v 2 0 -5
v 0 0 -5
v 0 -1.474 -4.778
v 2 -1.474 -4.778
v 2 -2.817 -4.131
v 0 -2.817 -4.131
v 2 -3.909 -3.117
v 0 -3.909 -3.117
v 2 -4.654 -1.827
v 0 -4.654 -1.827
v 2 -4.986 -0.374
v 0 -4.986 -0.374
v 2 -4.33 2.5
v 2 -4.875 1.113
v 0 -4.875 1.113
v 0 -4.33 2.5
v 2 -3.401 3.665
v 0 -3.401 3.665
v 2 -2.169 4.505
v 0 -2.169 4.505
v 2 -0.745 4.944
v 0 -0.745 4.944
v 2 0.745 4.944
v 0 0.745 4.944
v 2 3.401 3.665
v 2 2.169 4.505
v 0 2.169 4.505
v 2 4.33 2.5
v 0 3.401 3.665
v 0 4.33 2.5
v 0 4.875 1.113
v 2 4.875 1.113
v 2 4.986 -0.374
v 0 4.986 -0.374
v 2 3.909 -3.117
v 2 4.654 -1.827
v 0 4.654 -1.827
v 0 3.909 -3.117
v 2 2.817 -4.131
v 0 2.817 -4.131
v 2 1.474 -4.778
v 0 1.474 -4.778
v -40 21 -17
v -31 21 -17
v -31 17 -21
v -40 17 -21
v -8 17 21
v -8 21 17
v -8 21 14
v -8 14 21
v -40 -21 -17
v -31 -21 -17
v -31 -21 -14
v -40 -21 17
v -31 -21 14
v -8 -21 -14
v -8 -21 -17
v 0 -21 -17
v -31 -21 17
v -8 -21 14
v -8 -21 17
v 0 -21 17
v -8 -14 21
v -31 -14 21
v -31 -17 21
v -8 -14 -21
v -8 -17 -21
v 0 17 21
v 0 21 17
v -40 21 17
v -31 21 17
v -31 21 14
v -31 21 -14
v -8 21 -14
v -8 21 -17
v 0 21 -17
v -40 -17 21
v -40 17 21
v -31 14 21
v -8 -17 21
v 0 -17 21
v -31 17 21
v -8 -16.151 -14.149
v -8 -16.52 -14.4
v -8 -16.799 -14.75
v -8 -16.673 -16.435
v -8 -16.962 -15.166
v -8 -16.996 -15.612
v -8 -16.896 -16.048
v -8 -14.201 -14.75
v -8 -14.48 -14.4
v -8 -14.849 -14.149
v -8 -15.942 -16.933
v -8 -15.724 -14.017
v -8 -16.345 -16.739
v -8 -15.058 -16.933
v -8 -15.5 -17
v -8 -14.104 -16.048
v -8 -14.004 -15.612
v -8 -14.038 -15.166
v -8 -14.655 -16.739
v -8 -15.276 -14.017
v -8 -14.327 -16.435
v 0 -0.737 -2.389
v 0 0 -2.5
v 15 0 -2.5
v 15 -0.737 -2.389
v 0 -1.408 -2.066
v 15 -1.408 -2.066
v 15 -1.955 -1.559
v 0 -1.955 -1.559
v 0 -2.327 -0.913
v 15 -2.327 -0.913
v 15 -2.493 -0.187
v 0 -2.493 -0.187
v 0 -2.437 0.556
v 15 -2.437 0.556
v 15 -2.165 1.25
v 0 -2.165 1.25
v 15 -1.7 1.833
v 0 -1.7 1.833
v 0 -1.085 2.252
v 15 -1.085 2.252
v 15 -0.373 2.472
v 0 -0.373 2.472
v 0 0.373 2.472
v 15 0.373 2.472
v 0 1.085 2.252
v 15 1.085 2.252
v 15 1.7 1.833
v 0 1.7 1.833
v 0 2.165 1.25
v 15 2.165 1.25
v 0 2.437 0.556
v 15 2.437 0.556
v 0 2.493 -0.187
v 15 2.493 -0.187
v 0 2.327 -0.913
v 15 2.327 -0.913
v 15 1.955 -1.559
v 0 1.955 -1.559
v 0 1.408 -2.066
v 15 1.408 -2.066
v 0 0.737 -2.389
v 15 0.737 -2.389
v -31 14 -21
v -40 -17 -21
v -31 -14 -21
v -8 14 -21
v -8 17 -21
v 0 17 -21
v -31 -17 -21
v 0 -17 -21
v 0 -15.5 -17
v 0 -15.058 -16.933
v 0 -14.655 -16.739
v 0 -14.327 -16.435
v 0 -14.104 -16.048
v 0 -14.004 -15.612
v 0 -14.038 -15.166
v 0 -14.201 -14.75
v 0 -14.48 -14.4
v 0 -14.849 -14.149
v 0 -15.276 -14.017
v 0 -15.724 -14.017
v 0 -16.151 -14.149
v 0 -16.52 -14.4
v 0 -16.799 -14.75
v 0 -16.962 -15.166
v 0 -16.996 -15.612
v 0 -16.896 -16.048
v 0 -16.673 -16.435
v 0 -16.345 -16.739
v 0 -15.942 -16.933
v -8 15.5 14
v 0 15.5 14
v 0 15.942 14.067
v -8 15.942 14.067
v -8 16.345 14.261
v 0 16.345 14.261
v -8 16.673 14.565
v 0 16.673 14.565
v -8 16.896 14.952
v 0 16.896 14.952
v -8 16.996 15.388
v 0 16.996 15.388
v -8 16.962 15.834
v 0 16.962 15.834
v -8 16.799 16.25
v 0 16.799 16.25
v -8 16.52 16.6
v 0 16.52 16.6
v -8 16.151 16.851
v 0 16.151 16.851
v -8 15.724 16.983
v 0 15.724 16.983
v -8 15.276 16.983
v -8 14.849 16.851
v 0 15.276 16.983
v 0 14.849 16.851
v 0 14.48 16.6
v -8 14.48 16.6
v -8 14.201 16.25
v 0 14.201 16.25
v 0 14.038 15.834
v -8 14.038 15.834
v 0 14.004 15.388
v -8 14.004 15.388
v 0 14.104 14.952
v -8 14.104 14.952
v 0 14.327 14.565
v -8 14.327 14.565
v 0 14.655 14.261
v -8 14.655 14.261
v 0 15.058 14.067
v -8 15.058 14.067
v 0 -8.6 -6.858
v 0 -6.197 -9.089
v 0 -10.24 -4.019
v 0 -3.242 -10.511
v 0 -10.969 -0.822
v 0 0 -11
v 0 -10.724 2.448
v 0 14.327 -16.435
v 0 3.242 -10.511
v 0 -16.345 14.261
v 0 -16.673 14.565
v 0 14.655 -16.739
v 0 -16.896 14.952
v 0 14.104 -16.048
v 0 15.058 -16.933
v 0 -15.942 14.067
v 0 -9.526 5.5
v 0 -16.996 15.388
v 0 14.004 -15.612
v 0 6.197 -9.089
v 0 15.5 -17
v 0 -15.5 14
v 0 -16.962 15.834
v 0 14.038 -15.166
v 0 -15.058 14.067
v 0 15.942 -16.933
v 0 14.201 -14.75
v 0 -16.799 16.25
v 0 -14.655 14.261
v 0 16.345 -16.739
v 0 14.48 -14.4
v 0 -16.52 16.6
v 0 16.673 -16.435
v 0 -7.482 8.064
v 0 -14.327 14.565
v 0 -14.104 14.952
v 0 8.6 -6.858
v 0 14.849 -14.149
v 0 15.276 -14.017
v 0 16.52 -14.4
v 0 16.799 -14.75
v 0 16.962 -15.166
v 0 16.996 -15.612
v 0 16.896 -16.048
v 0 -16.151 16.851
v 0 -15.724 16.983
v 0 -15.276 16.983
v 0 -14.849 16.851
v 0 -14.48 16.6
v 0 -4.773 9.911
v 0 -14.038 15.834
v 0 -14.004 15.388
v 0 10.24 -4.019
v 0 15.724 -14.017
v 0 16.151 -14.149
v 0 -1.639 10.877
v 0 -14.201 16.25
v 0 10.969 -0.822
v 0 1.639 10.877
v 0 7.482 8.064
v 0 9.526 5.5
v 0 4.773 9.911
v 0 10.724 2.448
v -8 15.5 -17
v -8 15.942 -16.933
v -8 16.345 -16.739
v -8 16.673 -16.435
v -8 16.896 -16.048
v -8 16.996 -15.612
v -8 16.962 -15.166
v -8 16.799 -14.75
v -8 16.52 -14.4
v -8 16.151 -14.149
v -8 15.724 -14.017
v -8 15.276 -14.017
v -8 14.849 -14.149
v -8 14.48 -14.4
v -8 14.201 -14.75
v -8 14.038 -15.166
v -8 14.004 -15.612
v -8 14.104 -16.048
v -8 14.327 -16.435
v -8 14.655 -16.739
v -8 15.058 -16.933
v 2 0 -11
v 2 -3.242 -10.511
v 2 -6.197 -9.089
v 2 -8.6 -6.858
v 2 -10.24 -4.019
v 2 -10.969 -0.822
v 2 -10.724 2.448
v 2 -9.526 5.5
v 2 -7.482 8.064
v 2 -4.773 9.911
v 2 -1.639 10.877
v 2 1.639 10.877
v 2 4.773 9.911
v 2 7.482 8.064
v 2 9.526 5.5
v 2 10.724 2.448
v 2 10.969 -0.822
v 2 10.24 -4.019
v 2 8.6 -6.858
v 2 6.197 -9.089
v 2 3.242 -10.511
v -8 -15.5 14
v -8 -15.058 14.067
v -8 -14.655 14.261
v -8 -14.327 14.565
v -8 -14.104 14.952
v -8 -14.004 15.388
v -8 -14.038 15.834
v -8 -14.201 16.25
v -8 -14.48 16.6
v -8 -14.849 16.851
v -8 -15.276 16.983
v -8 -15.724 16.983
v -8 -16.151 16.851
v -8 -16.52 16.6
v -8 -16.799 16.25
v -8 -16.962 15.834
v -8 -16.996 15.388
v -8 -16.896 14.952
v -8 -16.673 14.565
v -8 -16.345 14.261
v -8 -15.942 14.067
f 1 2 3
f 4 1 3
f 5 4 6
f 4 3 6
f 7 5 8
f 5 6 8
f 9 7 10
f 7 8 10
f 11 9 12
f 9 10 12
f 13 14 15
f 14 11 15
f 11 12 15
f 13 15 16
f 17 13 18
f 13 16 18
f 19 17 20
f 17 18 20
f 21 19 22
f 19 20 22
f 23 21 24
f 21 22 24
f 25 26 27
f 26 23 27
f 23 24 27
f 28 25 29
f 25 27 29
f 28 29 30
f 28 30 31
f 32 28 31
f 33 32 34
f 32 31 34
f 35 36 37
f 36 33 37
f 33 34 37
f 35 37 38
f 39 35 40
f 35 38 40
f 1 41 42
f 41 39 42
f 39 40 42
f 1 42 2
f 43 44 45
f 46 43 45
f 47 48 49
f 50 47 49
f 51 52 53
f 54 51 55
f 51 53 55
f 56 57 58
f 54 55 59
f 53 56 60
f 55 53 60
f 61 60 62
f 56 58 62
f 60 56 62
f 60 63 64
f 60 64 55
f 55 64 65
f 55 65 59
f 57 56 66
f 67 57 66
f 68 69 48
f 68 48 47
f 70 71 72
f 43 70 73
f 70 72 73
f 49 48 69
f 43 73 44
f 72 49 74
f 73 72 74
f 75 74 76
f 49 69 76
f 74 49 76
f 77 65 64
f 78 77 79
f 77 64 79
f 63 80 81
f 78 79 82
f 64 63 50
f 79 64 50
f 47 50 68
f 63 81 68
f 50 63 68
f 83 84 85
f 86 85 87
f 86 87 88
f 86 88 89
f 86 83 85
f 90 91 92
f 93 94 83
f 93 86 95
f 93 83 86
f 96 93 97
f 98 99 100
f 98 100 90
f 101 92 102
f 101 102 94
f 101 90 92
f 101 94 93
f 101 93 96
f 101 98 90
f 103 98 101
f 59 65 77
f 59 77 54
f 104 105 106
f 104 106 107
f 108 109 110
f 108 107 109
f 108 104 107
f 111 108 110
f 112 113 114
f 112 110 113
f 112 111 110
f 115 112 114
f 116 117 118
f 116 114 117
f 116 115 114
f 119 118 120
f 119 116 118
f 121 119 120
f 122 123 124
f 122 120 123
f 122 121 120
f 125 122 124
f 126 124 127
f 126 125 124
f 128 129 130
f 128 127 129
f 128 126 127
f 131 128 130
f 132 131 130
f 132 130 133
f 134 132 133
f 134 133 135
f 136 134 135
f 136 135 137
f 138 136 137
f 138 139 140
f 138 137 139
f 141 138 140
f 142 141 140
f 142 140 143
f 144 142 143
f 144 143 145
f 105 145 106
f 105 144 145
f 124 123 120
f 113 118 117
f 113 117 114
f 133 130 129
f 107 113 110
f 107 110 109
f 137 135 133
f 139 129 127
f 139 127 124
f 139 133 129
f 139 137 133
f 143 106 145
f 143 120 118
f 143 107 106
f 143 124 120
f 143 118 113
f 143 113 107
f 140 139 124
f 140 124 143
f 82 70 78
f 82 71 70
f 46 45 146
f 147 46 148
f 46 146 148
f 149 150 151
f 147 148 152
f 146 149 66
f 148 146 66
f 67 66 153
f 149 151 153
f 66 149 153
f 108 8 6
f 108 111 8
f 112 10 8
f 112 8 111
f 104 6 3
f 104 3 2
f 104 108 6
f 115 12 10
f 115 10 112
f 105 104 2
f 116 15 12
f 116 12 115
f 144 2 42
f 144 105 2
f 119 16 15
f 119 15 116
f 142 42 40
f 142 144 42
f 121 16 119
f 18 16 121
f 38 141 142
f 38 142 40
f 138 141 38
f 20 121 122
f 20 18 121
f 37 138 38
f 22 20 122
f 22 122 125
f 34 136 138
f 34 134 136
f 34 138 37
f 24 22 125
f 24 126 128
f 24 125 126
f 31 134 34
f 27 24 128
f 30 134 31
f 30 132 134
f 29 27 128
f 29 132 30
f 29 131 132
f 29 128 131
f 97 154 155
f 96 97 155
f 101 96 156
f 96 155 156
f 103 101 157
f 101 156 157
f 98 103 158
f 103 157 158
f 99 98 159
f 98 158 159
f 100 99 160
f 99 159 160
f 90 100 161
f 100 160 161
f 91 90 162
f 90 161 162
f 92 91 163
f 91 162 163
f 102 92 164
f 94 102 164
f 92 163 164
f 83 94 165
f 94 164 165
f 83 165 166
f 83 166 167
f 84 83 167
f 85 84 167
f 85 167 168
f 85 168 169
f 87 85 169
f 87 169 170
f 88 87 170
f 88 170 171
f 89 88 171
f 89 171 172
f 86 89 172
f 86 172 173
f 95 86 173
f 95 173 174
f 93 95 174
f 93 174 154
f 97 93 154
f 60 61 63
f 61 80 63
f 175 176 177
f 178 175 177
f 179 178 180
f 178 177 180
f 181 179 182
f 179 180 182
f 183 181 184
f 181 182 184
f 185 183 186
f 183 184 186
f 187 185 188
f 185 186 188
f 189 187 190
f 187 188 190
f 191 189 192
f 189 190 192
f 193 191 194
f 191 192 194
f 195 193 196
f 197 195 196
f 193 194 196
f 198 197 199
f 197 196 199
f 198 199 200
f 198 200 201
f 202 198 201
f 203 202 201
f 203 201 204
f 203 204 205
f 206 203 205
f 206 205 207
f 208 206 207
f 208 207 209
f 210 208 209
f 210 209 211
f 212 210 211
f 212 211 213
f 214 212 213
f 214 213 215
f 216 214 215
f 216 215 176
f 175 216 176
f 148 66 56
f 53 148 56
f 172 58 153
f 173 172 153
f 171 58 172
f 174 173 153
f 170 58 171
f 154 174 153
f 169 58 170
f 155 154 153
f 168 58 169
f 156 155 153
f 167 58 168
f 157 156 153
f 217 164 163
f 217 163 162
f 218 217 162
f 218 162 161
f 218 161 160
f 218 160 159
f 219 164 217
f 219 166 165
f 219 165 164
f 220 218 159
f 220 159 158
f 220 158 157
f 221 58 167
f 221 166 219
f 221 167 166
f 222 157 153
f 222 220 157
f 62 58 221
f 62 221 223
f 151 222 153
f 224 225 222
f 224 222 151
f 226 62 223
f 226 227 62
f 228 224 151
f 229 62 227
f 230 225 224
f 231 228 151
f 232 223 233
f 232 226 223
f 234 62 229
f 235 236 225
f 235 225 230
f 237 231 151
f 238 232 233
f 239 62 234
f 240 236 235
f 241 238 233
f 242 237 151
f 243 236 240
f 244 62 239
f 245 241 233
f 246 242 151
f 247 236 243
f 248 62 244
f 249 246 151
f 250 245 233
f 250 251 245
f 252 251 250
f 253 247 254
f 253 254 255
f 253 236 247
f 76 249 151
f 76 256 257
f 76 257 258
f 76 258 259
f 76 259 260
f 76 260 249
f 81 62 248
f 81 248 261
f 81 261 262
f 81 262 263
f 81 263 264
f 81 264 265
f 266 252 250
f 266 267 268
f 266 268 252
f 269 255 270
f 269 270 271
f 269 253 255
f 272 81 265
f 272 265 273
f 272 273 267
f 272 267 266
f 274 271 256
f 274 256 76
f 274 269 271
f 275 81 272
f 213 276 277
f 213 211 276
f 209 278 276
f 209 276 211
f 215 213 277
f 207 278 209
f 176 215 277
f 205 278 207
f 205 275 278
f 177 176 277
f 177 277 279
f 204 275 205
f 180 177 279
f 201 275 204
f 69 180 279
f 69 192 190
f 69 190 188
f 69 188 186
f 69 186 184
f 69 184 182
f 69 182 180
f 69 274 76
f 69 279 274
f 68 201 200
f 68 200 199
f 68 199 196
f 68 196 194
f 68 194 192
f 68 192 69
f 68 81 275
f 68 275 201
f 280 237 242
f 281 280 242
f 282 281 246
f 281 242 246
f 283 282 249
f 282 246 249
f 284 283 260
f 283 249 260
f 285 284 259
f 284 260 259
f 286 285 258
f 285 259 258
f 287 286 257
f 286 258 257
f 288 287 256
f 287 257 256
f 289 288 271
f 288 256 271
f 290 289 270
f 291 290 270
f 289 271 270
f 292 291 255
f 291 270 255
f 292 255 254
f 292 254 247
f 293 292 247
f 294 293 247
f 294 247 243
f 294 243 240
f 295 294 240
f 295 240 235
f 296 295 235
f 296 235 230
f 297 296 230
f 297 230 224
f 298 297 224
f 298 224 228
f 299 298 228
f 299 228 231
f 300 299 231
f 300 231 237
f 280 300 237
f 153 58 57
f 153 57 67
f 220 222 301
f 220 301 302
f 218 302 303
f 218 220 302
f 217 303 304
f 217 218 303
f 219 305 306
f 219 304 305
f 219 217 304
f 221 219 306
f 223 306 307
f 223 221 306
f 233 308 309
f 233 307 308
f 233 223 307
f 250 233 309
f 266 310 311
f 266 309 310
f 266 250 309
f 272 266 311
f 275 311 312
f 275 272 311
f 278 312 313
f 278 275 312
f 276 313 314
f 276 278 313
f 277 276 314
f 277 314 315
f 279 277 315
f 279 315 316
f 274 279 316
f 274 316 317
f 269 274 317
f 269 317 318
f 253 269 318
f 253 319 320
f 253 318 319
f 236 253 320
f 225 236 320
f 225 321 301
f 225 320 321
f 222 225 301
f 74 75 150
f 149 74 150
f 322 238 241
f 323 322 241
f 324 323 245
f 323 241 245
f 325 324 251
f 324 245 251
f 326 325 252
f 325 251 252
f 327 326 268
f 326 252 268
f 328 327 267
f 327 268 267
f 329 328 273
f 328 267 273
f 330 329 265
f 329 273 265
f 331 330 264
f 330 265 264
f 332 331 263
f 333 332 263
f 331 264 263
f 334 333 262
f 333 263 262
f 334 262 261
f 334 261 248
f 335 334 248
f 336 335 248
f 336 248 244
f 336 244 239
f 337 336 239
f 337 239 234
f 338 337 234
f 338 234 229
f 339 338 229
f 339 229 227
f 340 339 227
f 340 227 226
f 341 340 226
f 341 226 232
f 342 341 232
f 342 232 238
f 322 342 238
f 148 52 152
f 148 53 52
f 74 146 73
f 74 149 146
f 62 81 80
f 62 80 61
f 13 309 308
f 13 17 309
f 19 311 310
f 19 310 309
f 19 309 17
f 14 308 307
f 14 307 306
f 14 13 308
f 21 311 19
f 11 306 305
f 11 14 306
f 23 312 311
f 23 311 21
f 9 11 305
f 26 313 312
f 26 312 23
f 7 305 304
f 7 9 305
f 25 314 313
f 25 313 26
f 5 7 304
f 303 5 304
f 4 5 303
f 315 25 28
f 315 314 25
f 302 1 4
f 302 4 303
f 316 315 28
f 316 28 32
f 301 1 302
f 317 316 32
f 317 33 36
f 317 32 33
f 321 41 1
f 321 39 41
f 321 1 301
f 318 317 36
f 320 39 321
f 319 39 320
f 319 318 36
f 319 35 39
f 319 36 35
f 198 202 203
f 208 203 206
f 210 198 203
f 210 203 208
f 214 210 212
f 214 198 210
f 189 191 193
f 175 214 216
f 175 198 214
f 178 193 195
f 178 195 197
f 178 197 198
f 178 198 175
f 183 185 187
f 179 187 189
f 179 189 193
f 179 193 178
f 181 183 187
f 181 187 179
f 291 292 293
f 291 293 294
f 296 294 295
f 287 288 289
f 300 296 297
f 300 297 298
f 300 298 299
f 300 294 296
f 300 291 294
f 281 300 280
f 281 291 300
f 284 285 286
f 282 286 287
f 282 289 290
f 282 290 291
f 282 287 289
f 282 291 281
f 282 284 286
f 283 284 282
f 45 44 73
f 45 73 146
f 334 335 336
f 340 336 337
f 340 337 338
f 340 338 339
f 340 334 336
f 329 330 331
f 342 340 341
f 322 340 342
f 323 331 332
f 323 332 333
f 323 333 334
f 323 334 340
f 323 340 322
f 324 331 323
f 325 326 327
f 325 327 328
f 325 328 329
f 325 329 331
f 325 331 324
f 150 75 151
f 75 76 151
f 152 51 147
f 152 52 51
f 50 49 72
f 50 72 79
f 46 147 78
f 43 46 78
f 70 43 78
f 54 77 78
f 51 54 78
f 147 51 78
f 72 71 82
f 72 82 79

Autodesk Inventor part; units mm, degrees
ref_plane "YZ Plane" through (0, 0, 0) normal (1, 0, 0) x (0, 1, 0)
ref_plane "XZ Plane" through (0, 0, 0) normal (0, 1, 0) x (-1, 0, 0)
ref_plane "XY Plane" through (0, 0, 0) normal (0, 0, 1) x (1, 0, 0)
sketch "Эскиз1" plane through (0, 0, 0) normal (1, 0, 0) x (0, 1, 0)
  line L0 (-17, 21) -> (17, 21)
  line L1 (21, 17) -> (21, -17)
  line L2 (17, -21) -> (-17, -21)
  line L3 (-21, -17) -> (-21, 17)
  line L4 (-21, 21) -> (21, -21) construction
  line L5 (21, 21) -> (-21, -21) construction
  line L6 (21, 17) -> (17, 21)
  line L7 (21, -17) -> (17, -21)
  line L8 (-17, 21) -> (-21, 17)
  line L9 (-21, -17) -> (-17, -21)
  point P0 (0, 0)
  dimension "d0" = 42
  dimension "d1" = 42
  dimension "d2" = 4
  dimension "d3" = 4
  dimension "d4" = 4
  dimension "d5" = 4
  dimension "d6" = 4
  dimension "d7" = 4
  dimension "d8" = 4
  dimension "d9" = 4
extrude "Выдавливание1" add sketch "Эскиз1" against normal blind 40
ref_plane "РабПлоскость1" through (-8, 0, 0) normal (1, 0, 0) x (0, 0, -1)
sketch "Эскиз2" plane through (-8, 0, 0) normal (1, 0, 0) x (0, 0, -1)
  line L0 (-21, -17) -> (-17, -21)
  line L1 (-14, -21) -> (14, -21)
  line L2 (17, -21) -> (21, -17)
  line L3 (21, -14) -> (21, 14)
  line L4 (21, 17) -> (17, 21)
  line L5 (17, 21) -> (-14, 21)
  line L6 (-17, 21) -> (-21, 17)
  line L7 (-21, 14) -> (-21, -14)
  line L8 (14, 21) -> (-17, 21)
  line L9 (-21, -17) -> (-21, 17)
  line L10 (21, -17) -> (21, 17)
  line L11 (-17, -21) -> (17, -21)
  line L12 (-14, 21) -> (-21, 14)
  line L13 (-21, -14) -> (-14, -21)
  line L14 (21, -14) -> (14, -21)
  line L15 (21, 14) -> (14, 21)
  point P0 (0, 0)
  point P1 (-21, 21)
  point P2 (-21, -21)
  point P3 (21, -21)
  point P4 (21, 21)
  point P5 (14, -21)
  point P6 (-14, 21)
  dimension "d14" = 7
  dimension "d15" = 7
  dimension "d16" = 7
  dimension "d17" = 7
  dimension "d18" = 7
  dimension "d19" = 7
  dimension "d20" = 7
  dimension "d21" = 7
extrude "Выдавливание2" cut sketch "Эскиз2" against normal blind 23 contours L9 L13 L11 L0 | L9 L6 L8 L12 | L14 L10 L2 L11 | L5 L4 L10 L15
sketch "Эскиз3" plane through (0, 0, 0) normal (1, 0, 0) x (0, 0, -1)
  line L0 (-21, -17) -> (-17, -21) projected
  line L1 (-17, -21) -> (17, -21) projected
  line L2 (17, -21) -> (21, -17) projected
  line L3 (21, -17) -> (21, 17) projected
  line L4 (21, 17) -> (17, 21) projected
  line L5 (17, 21) -> (-17, 21) projected
  line L6 (-17, 21) -> (-21, 17) projected
  line L7 (-21, 17) -> (-21, -17) projected
  circle A0 centre (0, 0) radius 2.5
  dimension "d24" = 5
extrude "Выдавливание3" add sketch "Эскиз3" along normal blind 15 contours A0
sketch "Эскиз4" plane through (0, 0, 0) normal (1, 0, 0) x (0, 0, -1)
  line L0 (-15.5, -15.5) -> (15.5, -15.5)
  line L1 (15.5, -15.5) -> (15.5, 15.5)
  line L2 (15.5, 15.5) -> (-15.5, 15.5)
  line L3 (-15.5, 15.5) -> (-15.5, -15.5)
  line L4 (-15.5, -15.5) -> (15.5, 15.5) construction
  line L5 (15.5, -15.5) -> (-15.5, 15.5) construction
  circle A0 centre (-15.5, 15.5) radius 1.5
  circle A1 centre (15.5, 15.5) radius 1.5
  circle A2 centre (15.5, -15.5) radius 1.5
  circle A3 centre (-15.5, -15.5) radius 1.5
  point P0 (0, 0)
  dimension "d27" = 31
  dimension "d28" = 31
  dimension "d29" = 3
  dimension "d30" = 3
  dimension "d31" = 3
  dimension "d32" = 3
extrude "Выдавливание4" cut sketch "Эскиз4" against normal blind 8 contours L3 A3 L0 | L0 A3 L3 | A2 L1 L0 | L0 L1 A2 | A0 L2 L3 | L3 L2 A0 | A1 L2 L1 | L1 L2 A1
sketch "Эскиз5" plane through (15, 0, 0) normal (1, 0, 0) x (0, 0, -1)
  point P0 (0, 0)
sketch "Эскиз6" plane through (0, 0, 0) normal (1, 0, 0) x (0, 0, -1)
  circle A0 centre (0, 0) radius 2.5 projected
  circle A1 centre (0, 0) radius 11
  circle A2 centre (0, 0) radius 5
  dimension "d35" = 22
  dimension "d36" = 6
extrude "Выдавливание5" add sketch "Эскиз6" along normal blind 2 contours A1
equation "\"d3\" = d2"
equation "\"d4\" = d2"
equation "\"d5\" = d4"
equation "\"d6\" = d2"
equation "\"d7\" = d6"
equation "\"d8\" = d2"
equation "\"d9\" = d8"
equation "\"d15\" = d14"
equation "\"d16\" = d14"
equation "\"d17\" = d16"
equation "\"d18\" = d14"
equation "\"d19\" = d18"
equation "\"d20\" = d14"
equation "\"d21\" = d20"
properties part number "Шаговик17" material "Сталь, литейная"
